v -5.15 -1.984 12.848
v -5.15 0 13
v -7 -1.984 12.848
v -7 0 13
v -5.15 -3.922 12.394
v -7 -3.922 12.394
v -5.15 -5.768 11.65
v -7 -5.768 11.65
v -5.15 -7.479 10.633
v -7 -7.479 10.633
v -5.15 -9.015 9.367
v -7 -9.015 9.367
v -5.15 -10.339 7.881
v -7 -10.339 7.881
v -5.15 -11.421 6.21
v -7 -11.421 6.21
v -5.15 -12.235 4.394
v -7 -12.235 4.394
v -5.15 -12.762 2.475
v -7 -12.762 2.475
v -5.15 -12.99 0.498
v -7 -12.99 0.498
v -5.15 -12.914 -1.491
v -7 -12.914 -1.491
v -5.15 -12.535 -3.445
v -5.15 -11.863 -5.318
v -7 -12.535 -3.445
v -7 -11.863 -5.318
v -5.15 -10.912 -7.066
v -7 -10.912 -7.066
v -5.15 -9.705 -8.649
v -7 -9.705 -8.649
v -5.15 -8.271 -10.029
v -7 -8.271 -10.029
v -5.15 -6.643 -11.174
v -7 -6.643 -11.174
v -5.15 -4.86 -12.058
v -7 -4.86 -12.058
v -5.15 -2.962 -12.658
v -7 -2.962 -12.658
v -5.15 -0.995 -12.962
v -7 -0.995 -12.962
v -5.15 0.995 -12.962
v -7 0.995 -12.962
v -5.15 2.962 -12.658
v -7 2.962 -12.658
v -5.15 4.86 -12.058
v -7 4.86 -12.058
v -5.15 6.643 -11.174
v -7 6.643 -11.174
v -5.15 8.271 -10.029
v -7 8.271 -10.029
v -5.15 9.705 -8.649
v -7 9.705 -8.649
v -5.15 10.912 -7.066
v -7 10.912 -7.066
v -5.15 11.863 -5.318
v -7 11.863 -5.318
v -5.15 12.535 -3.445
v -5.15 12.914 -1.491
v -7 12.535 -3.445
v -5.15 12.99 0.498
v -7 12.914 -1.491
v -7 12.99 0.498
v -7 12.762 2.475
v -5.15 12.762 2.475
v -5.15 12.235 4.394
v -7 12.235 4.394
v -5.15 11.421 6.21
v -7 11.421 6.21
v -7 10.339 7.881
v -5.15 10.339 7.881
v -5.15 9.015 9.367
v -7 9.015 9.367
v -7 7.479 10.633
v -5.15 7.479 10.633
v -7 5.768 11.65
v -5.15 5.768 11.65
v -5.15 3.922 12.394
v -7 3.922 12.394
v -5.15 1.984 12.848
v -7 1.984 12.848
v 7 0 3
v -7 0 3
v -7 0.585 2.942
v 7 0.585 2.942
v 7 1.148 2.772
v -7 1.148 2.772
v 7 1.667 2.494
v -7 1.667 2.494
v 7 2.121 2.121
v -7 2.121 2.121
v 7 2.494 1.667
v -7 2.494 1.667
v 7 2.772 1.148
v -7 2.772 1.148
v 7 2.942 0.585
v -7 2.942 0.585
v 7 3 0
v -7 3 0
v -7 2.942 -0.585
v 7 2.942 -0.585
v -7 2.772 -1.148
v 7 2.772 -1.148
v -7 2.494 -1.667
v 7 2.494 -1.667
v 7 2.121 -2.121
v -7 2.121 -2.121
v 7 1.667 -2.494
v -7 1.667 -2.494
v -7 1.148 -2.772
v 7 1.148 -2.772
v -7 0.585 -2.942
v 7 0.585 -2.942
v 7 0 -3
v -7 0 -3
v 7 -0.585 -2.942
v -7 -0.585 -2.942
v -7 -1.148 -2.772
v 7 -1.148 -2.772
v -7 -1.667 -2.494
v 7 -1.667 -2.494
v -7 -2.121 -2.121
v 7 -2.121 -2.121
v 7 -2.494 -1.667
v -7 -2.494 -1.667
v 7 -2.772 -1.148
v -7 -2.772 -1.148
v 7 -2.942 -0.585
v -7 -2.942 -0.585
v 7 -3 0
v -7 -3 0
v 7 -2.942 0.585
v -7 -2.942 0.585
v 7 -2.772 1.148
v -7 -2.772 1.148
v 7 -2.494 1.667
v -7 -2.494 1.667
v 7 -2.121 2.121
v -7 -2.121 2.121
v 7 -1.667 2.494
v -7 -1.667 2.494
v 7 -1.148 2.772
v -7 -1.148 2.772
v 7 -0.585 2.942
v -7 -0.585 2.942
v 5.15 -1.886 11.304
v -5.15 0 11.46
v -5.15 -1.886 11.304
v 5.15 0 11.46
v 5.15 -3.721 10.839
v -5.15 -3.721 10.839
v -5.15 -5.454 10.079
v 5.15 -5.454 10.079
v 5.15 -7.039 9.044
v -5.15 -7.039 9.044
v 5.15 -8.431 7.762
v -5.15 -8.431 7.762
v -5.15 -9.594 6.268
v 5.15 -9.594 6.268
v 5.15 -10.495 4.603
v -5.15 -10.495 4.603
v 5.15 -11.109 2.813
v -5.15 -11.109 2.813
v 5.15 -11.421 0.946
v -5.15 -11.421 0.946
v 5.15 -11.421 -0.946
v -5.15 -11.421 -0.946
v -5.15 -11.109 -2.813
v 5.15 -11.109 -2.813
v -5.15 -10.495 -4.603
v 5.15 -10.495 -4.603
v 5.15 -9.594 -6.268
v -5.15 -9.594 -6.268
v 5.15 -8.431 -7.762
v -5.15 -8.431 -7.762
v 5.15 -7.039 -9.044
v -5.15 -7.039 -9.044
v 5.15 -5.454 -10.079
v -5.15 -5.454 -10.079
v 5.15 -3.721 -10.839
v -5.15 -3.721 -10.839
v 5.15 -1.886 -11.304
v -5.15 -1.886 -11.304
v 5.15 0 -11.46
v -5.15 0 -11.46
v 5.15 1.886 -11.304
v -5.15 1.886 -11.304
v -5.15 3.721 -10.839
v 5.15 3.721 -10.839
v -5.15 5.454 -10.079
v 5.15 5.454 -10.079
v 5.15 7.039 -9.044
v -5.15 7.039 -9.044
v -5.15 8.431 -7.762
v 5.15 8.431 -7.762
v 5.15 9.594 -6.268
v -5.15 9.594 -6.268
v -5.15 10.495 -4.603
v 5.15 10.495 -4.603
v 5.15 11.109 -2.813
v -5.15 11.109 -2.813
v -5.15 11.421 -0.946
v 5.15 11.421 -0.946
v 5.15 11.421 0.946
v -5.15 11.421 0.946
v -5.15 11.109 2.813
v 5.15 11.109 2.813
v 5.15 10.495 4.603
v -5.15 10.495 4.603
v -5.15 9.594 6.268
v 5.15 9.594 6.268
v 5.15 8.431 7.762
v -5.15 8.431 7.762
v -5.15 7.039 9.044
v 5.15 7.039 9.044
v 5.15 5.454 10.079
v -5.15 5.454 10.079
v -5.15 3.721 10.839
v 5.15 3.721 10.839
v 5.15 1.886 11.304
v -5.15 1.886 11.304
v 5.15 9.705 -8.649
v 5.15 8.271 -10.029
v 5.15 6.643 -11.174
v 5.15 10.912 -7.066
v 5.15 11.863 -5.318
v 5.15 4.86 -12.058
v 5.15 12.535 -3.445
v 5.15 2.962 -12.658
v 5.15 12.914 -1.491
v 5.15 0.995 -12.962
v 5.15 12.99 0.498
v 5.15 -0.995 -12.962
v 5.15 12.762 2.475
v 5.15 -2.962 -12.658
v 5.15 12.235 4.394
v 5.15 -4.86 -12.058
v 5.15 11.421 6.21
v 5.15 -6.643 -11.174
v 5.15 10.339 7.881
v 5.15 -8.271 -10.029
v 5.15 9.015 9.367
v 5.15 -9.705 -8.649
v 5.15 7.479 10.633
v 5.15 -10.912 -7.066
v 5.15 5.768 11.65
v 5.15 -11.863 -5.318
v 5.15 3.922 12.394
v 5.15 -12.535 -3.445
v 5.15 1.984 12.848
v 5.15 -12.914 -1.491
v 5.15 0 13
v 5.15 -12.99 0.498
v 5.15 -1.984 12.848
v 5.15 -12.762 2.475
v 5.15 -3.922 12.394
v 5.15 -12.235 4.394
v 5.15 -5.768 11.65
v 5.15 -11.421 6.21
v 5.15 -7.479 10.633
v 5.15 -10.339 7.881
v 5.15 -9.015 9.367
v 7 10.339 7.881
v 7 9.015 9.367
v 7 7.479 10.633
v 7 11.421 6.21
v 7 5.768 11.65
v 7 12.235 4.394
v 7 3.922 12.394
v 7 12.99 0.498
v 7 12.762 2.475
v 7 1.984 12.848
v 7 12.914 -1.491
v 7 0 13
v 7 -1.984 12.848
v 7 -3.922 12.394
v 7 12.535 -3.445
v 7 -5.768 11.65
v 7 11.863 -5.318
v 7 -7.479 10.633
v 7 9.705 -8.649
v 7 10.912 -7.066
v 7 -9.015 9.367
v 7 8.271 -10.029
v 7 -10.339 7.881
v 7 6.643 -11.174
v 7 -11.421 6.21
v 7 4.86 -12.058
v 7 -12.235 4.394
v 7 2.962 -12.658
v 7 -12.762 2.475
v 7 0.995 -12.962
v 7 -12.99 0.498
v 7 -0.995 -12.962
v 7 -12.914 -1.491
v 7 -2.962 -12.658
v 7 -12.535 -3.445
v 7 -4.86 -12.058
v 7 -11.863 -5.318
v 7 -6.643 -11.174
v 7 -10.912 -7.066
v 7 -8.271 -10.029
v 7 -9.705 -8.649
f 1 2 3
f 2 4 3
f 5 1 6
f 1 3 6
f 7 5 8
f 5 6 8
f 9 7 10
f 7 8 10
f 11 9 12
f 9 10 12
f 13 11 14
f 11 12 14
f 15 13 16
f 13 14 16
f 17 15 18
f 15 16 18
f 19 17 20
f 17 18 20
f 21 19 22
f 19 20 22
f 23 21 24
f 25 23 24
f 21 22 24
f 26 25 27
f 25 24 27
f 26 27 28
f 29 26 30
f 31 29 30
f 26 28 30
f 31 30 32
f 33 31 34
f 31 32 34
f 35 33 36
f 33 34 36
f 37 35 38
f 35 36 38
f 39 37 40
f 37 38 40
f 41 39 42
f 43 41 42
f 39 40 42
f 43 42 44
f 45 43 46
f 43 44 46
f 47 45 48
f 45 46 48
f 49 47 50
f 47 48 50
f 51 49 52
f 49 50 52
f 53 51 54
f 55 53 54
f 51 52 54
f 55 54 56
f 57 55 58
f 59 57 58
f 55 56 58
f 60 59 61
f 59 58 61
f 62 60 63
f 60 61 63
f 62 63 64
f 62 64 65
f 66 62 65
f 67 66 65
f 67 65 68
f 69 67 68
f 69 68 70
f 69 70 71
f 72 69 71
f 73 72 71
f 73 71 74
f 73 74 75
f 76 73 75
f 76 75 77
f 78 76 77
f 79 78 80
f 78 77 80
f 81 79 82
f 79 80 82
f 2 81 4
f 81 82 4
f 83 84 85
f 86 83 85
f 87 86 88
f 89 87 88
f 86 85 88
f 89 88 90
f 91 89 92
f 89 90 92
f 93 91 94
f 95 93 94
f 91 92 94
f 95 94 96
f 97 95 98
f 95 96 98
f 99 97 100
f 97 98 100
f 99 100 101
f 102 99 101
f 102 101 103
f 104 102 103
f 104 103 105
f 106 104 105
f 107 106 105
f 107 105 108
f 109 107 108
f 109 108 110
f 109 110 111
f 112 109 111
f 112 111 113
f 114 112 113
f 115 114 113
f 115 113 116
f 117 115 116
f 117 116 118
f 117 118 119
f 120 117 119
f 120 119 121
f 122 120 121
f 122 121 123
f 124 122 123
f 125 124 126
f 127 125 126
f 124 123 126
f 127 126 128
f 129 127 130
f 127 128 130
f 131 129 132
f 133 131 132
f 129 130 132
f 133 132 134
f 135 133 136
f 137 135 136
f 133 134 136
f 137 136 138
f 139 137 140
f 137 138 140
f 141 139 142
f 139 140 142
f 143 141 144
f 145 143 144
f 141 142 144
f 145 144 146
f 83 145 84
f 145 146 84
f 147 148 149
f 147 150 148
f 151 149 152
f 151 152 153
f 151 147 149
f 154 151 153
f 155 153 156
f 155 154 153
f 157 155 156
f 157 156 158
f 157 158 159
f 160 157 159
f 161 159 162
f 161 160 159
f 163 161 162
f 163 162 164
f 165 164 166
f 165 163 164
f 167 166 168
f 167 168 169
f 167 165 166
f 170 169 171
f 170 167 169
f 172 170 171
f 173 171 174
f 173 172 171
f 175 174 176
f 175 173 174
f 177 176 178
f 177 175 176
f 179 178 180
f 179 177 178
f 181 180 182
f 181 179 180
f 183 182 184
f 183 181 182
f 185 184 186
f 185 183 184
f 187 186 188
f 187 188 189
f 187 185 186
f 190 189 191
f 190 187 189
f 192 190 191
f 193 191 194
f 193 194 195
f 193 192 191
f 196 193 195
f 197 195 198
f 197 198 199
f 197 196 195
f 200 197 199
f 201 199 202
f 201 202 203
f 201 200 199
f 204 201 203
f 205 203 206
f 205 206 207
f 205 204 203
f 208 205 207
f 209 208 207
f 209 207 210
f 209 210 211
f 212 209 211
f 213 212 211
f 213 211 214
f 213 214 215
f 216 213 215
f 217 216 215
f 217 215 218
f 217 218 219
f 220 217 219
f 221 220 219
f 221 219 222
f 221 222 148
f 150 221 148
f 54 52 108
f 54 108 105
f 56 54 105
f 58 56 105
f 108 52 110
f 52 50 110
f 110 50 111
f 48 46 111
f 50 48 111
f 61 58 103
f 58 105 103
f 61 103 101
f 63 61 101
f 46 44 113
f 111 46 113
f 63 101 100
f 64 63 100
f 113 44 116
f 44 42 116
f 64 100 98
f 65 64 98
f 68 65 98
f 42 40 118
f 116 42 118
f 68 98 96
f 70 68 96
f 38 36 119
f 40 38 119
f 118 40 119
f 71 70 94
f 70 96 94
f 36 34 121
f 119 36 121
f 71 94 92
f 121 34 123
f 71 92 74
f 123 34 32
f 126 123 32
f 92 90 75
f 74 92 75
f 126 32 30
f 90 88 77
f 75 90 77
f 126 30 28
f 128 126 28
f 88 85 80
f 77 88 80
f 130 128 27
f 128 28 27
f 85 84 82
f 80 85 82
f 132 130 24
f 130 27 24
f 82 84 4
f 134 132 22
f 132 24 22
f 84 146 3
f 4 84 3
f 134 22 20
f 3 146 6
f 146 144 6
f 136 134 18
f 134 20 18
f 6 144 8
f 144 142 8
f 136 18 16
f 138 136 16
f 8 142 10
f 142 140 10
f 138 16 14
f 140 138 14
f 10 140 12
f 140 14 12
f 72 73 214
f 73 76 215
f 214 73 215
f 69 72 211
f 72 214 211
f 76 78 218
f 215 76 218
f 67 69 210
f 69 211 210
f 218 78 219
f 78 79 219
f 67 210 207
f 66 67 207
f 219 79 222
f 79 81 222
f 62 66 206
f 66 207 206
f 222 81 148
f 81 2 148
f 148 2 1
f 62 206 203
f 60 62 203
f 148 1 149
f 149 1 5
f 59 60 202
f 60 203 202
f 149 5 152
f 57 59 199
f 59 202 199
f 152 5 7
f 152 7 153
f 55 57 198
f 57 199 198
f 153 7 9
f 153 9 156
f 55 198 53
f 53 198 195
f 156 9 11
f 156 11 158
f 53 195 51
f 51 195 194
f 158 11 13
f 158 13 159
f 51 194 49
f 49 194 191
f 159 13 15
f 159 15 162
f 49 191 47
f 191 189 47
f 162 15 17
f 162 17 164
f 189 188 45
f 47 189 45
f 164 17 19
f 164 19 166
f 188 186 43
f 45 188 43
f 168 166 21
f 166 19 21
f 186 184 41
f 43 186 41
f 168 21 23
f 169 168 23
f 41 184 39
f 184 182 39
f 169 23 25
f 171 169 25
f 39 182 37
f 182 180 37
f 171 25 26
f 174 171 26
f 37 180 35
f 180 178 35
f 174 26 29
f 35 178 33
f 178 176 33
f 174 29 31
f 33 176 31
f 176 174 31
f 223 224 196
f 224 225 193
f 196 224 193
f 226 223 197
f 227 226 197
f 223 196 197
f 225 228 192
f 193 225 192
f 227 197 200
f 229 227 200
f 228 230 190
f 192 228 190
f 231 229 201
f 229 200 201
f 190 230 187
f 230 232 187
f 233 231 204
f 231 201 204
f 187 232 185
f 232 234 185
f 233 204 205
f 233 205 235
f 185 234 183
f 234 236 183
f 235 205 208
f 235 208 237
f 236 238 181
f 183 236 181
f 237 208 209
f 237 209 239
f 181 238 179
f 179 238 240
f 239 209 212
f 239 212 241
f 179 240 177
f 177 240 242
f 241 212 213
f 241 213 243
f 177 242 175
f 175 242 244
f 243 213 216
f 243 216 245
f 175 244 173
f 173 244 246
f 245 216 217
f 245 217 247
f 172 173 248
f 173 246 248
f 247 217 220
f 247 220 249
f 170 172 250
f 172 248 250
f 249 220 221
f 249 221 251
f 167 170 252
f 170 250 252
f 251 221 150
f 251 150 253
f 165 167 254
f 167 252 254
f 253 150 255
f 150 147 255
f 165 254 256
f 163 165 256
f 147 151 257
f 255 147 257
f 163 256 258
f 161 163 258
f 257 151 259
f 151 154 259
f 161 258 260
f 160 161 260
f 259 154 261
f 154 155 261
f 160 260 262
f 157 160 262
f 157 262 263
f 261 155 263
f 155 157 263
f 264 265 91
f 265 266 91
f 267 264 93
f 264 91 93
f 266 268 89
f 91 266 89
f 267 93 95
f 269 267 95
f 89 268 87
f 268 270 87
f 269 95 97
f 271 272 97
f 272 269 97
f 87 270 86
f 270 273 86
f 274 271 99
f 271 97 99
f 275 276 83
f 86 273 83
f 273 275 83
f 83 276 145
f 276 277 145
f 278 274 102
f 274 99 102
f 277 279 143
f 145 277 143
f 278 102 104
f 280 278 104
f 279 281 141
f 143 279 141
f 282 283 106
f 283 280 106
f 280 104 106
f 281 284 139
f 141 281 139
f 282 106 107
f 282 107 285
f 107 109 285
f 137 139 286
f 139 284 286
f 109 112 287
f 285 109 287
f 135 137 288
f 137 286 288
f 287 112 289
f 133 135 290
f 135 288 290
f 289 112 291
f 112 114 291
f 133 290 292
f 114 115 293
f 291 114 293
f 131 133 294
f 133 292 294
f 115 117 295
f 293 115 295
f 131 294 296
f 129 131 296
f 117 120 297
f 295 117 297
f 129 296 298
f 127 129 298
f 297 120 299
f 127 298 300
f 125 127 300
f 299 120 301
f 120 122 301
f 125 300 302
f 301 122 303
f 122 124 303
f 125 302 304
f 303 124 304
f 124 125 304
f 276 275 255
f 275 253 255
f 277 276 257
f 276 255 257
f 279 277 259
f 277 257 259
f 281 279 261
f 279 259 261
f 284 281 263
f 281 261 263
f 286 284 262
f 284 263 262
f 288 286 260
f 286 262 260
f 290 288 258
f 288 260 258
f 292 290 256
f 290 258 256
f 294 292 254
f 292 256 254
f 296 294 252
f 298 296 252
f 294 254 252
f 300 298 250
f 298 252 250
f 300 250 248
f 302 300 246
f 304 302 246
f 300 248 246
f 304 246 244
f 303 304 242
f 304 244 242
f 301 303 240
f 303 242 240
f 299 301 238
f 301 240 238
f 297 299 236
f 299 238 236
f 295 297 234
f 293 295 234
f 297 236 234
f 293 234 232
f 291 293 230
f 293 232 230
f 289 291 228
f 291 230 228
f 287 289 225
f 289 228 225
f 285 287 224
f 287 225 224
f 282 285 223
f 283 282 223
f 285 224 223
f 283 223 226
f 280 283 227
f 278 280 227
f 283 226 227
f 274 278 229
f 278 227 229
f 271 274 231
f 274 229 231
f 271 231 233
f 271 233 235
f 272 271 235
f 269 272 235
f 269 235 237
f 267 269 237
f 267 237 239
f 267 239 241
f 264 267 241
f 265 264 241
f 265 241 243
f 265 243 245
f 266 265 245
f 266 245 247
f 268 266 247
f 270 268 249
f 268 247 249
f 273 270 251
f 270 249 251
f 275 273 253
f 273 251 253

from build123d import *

# Parameters (mm, degrees)
F_6_0_6_DIAMETER_HOLE2_D     = 6
F_6_0_6_DIAMETER_HOLE2_DEPTH = 24
F_6_0_6_DIAMETER_HOLE2_TIP   = 1.802581857


with BuildPart() as part:
    # Sketch1 → Revolve1 (revolve)
    with BuildSketch(Plane(origin=(0, 0, 0), x_dir=(1, 0, 0), z_dir=(0, 1, 0))):
        Polygon((0, -11.46), (-5.15, -11.46), (-5.15, -13), (-7, -13), (-7, 0), (7, 0), (7, -13), (5.15, -13), (5.15, -11.46), align=None)
    revolve(axis=Axis((-7, 0, 0), (1, 0, 0)))

    # Ø6.0 (6) Diameter Hole2
    with Locations(Plane(origin=(7, 0, 0), x_dir=(0, 0, -1), z_dir=(1, 0, 0))):
        with Locations((0, 0)):
            Hole(F_6_0_6_DIAMETER_HOLE2_D / 2, depth=F_6_0_6_DIAMETER_HOLE2_DEPTH)
            with Locations((0, 0, -(F_6_0_6_DIAMETER_HOLE2_DEPTH + F_6_0_6_DIAMETER_HOLE2_TIP / 2))):  # 118° drill point
                Cone(0, F_6_0_6_DIAMETER_HOLE2_D / 2, F_6_0_6_DIAMETER_HOLE2_TIP, mode=Mode.SUBTRACT)


solid = part.part
